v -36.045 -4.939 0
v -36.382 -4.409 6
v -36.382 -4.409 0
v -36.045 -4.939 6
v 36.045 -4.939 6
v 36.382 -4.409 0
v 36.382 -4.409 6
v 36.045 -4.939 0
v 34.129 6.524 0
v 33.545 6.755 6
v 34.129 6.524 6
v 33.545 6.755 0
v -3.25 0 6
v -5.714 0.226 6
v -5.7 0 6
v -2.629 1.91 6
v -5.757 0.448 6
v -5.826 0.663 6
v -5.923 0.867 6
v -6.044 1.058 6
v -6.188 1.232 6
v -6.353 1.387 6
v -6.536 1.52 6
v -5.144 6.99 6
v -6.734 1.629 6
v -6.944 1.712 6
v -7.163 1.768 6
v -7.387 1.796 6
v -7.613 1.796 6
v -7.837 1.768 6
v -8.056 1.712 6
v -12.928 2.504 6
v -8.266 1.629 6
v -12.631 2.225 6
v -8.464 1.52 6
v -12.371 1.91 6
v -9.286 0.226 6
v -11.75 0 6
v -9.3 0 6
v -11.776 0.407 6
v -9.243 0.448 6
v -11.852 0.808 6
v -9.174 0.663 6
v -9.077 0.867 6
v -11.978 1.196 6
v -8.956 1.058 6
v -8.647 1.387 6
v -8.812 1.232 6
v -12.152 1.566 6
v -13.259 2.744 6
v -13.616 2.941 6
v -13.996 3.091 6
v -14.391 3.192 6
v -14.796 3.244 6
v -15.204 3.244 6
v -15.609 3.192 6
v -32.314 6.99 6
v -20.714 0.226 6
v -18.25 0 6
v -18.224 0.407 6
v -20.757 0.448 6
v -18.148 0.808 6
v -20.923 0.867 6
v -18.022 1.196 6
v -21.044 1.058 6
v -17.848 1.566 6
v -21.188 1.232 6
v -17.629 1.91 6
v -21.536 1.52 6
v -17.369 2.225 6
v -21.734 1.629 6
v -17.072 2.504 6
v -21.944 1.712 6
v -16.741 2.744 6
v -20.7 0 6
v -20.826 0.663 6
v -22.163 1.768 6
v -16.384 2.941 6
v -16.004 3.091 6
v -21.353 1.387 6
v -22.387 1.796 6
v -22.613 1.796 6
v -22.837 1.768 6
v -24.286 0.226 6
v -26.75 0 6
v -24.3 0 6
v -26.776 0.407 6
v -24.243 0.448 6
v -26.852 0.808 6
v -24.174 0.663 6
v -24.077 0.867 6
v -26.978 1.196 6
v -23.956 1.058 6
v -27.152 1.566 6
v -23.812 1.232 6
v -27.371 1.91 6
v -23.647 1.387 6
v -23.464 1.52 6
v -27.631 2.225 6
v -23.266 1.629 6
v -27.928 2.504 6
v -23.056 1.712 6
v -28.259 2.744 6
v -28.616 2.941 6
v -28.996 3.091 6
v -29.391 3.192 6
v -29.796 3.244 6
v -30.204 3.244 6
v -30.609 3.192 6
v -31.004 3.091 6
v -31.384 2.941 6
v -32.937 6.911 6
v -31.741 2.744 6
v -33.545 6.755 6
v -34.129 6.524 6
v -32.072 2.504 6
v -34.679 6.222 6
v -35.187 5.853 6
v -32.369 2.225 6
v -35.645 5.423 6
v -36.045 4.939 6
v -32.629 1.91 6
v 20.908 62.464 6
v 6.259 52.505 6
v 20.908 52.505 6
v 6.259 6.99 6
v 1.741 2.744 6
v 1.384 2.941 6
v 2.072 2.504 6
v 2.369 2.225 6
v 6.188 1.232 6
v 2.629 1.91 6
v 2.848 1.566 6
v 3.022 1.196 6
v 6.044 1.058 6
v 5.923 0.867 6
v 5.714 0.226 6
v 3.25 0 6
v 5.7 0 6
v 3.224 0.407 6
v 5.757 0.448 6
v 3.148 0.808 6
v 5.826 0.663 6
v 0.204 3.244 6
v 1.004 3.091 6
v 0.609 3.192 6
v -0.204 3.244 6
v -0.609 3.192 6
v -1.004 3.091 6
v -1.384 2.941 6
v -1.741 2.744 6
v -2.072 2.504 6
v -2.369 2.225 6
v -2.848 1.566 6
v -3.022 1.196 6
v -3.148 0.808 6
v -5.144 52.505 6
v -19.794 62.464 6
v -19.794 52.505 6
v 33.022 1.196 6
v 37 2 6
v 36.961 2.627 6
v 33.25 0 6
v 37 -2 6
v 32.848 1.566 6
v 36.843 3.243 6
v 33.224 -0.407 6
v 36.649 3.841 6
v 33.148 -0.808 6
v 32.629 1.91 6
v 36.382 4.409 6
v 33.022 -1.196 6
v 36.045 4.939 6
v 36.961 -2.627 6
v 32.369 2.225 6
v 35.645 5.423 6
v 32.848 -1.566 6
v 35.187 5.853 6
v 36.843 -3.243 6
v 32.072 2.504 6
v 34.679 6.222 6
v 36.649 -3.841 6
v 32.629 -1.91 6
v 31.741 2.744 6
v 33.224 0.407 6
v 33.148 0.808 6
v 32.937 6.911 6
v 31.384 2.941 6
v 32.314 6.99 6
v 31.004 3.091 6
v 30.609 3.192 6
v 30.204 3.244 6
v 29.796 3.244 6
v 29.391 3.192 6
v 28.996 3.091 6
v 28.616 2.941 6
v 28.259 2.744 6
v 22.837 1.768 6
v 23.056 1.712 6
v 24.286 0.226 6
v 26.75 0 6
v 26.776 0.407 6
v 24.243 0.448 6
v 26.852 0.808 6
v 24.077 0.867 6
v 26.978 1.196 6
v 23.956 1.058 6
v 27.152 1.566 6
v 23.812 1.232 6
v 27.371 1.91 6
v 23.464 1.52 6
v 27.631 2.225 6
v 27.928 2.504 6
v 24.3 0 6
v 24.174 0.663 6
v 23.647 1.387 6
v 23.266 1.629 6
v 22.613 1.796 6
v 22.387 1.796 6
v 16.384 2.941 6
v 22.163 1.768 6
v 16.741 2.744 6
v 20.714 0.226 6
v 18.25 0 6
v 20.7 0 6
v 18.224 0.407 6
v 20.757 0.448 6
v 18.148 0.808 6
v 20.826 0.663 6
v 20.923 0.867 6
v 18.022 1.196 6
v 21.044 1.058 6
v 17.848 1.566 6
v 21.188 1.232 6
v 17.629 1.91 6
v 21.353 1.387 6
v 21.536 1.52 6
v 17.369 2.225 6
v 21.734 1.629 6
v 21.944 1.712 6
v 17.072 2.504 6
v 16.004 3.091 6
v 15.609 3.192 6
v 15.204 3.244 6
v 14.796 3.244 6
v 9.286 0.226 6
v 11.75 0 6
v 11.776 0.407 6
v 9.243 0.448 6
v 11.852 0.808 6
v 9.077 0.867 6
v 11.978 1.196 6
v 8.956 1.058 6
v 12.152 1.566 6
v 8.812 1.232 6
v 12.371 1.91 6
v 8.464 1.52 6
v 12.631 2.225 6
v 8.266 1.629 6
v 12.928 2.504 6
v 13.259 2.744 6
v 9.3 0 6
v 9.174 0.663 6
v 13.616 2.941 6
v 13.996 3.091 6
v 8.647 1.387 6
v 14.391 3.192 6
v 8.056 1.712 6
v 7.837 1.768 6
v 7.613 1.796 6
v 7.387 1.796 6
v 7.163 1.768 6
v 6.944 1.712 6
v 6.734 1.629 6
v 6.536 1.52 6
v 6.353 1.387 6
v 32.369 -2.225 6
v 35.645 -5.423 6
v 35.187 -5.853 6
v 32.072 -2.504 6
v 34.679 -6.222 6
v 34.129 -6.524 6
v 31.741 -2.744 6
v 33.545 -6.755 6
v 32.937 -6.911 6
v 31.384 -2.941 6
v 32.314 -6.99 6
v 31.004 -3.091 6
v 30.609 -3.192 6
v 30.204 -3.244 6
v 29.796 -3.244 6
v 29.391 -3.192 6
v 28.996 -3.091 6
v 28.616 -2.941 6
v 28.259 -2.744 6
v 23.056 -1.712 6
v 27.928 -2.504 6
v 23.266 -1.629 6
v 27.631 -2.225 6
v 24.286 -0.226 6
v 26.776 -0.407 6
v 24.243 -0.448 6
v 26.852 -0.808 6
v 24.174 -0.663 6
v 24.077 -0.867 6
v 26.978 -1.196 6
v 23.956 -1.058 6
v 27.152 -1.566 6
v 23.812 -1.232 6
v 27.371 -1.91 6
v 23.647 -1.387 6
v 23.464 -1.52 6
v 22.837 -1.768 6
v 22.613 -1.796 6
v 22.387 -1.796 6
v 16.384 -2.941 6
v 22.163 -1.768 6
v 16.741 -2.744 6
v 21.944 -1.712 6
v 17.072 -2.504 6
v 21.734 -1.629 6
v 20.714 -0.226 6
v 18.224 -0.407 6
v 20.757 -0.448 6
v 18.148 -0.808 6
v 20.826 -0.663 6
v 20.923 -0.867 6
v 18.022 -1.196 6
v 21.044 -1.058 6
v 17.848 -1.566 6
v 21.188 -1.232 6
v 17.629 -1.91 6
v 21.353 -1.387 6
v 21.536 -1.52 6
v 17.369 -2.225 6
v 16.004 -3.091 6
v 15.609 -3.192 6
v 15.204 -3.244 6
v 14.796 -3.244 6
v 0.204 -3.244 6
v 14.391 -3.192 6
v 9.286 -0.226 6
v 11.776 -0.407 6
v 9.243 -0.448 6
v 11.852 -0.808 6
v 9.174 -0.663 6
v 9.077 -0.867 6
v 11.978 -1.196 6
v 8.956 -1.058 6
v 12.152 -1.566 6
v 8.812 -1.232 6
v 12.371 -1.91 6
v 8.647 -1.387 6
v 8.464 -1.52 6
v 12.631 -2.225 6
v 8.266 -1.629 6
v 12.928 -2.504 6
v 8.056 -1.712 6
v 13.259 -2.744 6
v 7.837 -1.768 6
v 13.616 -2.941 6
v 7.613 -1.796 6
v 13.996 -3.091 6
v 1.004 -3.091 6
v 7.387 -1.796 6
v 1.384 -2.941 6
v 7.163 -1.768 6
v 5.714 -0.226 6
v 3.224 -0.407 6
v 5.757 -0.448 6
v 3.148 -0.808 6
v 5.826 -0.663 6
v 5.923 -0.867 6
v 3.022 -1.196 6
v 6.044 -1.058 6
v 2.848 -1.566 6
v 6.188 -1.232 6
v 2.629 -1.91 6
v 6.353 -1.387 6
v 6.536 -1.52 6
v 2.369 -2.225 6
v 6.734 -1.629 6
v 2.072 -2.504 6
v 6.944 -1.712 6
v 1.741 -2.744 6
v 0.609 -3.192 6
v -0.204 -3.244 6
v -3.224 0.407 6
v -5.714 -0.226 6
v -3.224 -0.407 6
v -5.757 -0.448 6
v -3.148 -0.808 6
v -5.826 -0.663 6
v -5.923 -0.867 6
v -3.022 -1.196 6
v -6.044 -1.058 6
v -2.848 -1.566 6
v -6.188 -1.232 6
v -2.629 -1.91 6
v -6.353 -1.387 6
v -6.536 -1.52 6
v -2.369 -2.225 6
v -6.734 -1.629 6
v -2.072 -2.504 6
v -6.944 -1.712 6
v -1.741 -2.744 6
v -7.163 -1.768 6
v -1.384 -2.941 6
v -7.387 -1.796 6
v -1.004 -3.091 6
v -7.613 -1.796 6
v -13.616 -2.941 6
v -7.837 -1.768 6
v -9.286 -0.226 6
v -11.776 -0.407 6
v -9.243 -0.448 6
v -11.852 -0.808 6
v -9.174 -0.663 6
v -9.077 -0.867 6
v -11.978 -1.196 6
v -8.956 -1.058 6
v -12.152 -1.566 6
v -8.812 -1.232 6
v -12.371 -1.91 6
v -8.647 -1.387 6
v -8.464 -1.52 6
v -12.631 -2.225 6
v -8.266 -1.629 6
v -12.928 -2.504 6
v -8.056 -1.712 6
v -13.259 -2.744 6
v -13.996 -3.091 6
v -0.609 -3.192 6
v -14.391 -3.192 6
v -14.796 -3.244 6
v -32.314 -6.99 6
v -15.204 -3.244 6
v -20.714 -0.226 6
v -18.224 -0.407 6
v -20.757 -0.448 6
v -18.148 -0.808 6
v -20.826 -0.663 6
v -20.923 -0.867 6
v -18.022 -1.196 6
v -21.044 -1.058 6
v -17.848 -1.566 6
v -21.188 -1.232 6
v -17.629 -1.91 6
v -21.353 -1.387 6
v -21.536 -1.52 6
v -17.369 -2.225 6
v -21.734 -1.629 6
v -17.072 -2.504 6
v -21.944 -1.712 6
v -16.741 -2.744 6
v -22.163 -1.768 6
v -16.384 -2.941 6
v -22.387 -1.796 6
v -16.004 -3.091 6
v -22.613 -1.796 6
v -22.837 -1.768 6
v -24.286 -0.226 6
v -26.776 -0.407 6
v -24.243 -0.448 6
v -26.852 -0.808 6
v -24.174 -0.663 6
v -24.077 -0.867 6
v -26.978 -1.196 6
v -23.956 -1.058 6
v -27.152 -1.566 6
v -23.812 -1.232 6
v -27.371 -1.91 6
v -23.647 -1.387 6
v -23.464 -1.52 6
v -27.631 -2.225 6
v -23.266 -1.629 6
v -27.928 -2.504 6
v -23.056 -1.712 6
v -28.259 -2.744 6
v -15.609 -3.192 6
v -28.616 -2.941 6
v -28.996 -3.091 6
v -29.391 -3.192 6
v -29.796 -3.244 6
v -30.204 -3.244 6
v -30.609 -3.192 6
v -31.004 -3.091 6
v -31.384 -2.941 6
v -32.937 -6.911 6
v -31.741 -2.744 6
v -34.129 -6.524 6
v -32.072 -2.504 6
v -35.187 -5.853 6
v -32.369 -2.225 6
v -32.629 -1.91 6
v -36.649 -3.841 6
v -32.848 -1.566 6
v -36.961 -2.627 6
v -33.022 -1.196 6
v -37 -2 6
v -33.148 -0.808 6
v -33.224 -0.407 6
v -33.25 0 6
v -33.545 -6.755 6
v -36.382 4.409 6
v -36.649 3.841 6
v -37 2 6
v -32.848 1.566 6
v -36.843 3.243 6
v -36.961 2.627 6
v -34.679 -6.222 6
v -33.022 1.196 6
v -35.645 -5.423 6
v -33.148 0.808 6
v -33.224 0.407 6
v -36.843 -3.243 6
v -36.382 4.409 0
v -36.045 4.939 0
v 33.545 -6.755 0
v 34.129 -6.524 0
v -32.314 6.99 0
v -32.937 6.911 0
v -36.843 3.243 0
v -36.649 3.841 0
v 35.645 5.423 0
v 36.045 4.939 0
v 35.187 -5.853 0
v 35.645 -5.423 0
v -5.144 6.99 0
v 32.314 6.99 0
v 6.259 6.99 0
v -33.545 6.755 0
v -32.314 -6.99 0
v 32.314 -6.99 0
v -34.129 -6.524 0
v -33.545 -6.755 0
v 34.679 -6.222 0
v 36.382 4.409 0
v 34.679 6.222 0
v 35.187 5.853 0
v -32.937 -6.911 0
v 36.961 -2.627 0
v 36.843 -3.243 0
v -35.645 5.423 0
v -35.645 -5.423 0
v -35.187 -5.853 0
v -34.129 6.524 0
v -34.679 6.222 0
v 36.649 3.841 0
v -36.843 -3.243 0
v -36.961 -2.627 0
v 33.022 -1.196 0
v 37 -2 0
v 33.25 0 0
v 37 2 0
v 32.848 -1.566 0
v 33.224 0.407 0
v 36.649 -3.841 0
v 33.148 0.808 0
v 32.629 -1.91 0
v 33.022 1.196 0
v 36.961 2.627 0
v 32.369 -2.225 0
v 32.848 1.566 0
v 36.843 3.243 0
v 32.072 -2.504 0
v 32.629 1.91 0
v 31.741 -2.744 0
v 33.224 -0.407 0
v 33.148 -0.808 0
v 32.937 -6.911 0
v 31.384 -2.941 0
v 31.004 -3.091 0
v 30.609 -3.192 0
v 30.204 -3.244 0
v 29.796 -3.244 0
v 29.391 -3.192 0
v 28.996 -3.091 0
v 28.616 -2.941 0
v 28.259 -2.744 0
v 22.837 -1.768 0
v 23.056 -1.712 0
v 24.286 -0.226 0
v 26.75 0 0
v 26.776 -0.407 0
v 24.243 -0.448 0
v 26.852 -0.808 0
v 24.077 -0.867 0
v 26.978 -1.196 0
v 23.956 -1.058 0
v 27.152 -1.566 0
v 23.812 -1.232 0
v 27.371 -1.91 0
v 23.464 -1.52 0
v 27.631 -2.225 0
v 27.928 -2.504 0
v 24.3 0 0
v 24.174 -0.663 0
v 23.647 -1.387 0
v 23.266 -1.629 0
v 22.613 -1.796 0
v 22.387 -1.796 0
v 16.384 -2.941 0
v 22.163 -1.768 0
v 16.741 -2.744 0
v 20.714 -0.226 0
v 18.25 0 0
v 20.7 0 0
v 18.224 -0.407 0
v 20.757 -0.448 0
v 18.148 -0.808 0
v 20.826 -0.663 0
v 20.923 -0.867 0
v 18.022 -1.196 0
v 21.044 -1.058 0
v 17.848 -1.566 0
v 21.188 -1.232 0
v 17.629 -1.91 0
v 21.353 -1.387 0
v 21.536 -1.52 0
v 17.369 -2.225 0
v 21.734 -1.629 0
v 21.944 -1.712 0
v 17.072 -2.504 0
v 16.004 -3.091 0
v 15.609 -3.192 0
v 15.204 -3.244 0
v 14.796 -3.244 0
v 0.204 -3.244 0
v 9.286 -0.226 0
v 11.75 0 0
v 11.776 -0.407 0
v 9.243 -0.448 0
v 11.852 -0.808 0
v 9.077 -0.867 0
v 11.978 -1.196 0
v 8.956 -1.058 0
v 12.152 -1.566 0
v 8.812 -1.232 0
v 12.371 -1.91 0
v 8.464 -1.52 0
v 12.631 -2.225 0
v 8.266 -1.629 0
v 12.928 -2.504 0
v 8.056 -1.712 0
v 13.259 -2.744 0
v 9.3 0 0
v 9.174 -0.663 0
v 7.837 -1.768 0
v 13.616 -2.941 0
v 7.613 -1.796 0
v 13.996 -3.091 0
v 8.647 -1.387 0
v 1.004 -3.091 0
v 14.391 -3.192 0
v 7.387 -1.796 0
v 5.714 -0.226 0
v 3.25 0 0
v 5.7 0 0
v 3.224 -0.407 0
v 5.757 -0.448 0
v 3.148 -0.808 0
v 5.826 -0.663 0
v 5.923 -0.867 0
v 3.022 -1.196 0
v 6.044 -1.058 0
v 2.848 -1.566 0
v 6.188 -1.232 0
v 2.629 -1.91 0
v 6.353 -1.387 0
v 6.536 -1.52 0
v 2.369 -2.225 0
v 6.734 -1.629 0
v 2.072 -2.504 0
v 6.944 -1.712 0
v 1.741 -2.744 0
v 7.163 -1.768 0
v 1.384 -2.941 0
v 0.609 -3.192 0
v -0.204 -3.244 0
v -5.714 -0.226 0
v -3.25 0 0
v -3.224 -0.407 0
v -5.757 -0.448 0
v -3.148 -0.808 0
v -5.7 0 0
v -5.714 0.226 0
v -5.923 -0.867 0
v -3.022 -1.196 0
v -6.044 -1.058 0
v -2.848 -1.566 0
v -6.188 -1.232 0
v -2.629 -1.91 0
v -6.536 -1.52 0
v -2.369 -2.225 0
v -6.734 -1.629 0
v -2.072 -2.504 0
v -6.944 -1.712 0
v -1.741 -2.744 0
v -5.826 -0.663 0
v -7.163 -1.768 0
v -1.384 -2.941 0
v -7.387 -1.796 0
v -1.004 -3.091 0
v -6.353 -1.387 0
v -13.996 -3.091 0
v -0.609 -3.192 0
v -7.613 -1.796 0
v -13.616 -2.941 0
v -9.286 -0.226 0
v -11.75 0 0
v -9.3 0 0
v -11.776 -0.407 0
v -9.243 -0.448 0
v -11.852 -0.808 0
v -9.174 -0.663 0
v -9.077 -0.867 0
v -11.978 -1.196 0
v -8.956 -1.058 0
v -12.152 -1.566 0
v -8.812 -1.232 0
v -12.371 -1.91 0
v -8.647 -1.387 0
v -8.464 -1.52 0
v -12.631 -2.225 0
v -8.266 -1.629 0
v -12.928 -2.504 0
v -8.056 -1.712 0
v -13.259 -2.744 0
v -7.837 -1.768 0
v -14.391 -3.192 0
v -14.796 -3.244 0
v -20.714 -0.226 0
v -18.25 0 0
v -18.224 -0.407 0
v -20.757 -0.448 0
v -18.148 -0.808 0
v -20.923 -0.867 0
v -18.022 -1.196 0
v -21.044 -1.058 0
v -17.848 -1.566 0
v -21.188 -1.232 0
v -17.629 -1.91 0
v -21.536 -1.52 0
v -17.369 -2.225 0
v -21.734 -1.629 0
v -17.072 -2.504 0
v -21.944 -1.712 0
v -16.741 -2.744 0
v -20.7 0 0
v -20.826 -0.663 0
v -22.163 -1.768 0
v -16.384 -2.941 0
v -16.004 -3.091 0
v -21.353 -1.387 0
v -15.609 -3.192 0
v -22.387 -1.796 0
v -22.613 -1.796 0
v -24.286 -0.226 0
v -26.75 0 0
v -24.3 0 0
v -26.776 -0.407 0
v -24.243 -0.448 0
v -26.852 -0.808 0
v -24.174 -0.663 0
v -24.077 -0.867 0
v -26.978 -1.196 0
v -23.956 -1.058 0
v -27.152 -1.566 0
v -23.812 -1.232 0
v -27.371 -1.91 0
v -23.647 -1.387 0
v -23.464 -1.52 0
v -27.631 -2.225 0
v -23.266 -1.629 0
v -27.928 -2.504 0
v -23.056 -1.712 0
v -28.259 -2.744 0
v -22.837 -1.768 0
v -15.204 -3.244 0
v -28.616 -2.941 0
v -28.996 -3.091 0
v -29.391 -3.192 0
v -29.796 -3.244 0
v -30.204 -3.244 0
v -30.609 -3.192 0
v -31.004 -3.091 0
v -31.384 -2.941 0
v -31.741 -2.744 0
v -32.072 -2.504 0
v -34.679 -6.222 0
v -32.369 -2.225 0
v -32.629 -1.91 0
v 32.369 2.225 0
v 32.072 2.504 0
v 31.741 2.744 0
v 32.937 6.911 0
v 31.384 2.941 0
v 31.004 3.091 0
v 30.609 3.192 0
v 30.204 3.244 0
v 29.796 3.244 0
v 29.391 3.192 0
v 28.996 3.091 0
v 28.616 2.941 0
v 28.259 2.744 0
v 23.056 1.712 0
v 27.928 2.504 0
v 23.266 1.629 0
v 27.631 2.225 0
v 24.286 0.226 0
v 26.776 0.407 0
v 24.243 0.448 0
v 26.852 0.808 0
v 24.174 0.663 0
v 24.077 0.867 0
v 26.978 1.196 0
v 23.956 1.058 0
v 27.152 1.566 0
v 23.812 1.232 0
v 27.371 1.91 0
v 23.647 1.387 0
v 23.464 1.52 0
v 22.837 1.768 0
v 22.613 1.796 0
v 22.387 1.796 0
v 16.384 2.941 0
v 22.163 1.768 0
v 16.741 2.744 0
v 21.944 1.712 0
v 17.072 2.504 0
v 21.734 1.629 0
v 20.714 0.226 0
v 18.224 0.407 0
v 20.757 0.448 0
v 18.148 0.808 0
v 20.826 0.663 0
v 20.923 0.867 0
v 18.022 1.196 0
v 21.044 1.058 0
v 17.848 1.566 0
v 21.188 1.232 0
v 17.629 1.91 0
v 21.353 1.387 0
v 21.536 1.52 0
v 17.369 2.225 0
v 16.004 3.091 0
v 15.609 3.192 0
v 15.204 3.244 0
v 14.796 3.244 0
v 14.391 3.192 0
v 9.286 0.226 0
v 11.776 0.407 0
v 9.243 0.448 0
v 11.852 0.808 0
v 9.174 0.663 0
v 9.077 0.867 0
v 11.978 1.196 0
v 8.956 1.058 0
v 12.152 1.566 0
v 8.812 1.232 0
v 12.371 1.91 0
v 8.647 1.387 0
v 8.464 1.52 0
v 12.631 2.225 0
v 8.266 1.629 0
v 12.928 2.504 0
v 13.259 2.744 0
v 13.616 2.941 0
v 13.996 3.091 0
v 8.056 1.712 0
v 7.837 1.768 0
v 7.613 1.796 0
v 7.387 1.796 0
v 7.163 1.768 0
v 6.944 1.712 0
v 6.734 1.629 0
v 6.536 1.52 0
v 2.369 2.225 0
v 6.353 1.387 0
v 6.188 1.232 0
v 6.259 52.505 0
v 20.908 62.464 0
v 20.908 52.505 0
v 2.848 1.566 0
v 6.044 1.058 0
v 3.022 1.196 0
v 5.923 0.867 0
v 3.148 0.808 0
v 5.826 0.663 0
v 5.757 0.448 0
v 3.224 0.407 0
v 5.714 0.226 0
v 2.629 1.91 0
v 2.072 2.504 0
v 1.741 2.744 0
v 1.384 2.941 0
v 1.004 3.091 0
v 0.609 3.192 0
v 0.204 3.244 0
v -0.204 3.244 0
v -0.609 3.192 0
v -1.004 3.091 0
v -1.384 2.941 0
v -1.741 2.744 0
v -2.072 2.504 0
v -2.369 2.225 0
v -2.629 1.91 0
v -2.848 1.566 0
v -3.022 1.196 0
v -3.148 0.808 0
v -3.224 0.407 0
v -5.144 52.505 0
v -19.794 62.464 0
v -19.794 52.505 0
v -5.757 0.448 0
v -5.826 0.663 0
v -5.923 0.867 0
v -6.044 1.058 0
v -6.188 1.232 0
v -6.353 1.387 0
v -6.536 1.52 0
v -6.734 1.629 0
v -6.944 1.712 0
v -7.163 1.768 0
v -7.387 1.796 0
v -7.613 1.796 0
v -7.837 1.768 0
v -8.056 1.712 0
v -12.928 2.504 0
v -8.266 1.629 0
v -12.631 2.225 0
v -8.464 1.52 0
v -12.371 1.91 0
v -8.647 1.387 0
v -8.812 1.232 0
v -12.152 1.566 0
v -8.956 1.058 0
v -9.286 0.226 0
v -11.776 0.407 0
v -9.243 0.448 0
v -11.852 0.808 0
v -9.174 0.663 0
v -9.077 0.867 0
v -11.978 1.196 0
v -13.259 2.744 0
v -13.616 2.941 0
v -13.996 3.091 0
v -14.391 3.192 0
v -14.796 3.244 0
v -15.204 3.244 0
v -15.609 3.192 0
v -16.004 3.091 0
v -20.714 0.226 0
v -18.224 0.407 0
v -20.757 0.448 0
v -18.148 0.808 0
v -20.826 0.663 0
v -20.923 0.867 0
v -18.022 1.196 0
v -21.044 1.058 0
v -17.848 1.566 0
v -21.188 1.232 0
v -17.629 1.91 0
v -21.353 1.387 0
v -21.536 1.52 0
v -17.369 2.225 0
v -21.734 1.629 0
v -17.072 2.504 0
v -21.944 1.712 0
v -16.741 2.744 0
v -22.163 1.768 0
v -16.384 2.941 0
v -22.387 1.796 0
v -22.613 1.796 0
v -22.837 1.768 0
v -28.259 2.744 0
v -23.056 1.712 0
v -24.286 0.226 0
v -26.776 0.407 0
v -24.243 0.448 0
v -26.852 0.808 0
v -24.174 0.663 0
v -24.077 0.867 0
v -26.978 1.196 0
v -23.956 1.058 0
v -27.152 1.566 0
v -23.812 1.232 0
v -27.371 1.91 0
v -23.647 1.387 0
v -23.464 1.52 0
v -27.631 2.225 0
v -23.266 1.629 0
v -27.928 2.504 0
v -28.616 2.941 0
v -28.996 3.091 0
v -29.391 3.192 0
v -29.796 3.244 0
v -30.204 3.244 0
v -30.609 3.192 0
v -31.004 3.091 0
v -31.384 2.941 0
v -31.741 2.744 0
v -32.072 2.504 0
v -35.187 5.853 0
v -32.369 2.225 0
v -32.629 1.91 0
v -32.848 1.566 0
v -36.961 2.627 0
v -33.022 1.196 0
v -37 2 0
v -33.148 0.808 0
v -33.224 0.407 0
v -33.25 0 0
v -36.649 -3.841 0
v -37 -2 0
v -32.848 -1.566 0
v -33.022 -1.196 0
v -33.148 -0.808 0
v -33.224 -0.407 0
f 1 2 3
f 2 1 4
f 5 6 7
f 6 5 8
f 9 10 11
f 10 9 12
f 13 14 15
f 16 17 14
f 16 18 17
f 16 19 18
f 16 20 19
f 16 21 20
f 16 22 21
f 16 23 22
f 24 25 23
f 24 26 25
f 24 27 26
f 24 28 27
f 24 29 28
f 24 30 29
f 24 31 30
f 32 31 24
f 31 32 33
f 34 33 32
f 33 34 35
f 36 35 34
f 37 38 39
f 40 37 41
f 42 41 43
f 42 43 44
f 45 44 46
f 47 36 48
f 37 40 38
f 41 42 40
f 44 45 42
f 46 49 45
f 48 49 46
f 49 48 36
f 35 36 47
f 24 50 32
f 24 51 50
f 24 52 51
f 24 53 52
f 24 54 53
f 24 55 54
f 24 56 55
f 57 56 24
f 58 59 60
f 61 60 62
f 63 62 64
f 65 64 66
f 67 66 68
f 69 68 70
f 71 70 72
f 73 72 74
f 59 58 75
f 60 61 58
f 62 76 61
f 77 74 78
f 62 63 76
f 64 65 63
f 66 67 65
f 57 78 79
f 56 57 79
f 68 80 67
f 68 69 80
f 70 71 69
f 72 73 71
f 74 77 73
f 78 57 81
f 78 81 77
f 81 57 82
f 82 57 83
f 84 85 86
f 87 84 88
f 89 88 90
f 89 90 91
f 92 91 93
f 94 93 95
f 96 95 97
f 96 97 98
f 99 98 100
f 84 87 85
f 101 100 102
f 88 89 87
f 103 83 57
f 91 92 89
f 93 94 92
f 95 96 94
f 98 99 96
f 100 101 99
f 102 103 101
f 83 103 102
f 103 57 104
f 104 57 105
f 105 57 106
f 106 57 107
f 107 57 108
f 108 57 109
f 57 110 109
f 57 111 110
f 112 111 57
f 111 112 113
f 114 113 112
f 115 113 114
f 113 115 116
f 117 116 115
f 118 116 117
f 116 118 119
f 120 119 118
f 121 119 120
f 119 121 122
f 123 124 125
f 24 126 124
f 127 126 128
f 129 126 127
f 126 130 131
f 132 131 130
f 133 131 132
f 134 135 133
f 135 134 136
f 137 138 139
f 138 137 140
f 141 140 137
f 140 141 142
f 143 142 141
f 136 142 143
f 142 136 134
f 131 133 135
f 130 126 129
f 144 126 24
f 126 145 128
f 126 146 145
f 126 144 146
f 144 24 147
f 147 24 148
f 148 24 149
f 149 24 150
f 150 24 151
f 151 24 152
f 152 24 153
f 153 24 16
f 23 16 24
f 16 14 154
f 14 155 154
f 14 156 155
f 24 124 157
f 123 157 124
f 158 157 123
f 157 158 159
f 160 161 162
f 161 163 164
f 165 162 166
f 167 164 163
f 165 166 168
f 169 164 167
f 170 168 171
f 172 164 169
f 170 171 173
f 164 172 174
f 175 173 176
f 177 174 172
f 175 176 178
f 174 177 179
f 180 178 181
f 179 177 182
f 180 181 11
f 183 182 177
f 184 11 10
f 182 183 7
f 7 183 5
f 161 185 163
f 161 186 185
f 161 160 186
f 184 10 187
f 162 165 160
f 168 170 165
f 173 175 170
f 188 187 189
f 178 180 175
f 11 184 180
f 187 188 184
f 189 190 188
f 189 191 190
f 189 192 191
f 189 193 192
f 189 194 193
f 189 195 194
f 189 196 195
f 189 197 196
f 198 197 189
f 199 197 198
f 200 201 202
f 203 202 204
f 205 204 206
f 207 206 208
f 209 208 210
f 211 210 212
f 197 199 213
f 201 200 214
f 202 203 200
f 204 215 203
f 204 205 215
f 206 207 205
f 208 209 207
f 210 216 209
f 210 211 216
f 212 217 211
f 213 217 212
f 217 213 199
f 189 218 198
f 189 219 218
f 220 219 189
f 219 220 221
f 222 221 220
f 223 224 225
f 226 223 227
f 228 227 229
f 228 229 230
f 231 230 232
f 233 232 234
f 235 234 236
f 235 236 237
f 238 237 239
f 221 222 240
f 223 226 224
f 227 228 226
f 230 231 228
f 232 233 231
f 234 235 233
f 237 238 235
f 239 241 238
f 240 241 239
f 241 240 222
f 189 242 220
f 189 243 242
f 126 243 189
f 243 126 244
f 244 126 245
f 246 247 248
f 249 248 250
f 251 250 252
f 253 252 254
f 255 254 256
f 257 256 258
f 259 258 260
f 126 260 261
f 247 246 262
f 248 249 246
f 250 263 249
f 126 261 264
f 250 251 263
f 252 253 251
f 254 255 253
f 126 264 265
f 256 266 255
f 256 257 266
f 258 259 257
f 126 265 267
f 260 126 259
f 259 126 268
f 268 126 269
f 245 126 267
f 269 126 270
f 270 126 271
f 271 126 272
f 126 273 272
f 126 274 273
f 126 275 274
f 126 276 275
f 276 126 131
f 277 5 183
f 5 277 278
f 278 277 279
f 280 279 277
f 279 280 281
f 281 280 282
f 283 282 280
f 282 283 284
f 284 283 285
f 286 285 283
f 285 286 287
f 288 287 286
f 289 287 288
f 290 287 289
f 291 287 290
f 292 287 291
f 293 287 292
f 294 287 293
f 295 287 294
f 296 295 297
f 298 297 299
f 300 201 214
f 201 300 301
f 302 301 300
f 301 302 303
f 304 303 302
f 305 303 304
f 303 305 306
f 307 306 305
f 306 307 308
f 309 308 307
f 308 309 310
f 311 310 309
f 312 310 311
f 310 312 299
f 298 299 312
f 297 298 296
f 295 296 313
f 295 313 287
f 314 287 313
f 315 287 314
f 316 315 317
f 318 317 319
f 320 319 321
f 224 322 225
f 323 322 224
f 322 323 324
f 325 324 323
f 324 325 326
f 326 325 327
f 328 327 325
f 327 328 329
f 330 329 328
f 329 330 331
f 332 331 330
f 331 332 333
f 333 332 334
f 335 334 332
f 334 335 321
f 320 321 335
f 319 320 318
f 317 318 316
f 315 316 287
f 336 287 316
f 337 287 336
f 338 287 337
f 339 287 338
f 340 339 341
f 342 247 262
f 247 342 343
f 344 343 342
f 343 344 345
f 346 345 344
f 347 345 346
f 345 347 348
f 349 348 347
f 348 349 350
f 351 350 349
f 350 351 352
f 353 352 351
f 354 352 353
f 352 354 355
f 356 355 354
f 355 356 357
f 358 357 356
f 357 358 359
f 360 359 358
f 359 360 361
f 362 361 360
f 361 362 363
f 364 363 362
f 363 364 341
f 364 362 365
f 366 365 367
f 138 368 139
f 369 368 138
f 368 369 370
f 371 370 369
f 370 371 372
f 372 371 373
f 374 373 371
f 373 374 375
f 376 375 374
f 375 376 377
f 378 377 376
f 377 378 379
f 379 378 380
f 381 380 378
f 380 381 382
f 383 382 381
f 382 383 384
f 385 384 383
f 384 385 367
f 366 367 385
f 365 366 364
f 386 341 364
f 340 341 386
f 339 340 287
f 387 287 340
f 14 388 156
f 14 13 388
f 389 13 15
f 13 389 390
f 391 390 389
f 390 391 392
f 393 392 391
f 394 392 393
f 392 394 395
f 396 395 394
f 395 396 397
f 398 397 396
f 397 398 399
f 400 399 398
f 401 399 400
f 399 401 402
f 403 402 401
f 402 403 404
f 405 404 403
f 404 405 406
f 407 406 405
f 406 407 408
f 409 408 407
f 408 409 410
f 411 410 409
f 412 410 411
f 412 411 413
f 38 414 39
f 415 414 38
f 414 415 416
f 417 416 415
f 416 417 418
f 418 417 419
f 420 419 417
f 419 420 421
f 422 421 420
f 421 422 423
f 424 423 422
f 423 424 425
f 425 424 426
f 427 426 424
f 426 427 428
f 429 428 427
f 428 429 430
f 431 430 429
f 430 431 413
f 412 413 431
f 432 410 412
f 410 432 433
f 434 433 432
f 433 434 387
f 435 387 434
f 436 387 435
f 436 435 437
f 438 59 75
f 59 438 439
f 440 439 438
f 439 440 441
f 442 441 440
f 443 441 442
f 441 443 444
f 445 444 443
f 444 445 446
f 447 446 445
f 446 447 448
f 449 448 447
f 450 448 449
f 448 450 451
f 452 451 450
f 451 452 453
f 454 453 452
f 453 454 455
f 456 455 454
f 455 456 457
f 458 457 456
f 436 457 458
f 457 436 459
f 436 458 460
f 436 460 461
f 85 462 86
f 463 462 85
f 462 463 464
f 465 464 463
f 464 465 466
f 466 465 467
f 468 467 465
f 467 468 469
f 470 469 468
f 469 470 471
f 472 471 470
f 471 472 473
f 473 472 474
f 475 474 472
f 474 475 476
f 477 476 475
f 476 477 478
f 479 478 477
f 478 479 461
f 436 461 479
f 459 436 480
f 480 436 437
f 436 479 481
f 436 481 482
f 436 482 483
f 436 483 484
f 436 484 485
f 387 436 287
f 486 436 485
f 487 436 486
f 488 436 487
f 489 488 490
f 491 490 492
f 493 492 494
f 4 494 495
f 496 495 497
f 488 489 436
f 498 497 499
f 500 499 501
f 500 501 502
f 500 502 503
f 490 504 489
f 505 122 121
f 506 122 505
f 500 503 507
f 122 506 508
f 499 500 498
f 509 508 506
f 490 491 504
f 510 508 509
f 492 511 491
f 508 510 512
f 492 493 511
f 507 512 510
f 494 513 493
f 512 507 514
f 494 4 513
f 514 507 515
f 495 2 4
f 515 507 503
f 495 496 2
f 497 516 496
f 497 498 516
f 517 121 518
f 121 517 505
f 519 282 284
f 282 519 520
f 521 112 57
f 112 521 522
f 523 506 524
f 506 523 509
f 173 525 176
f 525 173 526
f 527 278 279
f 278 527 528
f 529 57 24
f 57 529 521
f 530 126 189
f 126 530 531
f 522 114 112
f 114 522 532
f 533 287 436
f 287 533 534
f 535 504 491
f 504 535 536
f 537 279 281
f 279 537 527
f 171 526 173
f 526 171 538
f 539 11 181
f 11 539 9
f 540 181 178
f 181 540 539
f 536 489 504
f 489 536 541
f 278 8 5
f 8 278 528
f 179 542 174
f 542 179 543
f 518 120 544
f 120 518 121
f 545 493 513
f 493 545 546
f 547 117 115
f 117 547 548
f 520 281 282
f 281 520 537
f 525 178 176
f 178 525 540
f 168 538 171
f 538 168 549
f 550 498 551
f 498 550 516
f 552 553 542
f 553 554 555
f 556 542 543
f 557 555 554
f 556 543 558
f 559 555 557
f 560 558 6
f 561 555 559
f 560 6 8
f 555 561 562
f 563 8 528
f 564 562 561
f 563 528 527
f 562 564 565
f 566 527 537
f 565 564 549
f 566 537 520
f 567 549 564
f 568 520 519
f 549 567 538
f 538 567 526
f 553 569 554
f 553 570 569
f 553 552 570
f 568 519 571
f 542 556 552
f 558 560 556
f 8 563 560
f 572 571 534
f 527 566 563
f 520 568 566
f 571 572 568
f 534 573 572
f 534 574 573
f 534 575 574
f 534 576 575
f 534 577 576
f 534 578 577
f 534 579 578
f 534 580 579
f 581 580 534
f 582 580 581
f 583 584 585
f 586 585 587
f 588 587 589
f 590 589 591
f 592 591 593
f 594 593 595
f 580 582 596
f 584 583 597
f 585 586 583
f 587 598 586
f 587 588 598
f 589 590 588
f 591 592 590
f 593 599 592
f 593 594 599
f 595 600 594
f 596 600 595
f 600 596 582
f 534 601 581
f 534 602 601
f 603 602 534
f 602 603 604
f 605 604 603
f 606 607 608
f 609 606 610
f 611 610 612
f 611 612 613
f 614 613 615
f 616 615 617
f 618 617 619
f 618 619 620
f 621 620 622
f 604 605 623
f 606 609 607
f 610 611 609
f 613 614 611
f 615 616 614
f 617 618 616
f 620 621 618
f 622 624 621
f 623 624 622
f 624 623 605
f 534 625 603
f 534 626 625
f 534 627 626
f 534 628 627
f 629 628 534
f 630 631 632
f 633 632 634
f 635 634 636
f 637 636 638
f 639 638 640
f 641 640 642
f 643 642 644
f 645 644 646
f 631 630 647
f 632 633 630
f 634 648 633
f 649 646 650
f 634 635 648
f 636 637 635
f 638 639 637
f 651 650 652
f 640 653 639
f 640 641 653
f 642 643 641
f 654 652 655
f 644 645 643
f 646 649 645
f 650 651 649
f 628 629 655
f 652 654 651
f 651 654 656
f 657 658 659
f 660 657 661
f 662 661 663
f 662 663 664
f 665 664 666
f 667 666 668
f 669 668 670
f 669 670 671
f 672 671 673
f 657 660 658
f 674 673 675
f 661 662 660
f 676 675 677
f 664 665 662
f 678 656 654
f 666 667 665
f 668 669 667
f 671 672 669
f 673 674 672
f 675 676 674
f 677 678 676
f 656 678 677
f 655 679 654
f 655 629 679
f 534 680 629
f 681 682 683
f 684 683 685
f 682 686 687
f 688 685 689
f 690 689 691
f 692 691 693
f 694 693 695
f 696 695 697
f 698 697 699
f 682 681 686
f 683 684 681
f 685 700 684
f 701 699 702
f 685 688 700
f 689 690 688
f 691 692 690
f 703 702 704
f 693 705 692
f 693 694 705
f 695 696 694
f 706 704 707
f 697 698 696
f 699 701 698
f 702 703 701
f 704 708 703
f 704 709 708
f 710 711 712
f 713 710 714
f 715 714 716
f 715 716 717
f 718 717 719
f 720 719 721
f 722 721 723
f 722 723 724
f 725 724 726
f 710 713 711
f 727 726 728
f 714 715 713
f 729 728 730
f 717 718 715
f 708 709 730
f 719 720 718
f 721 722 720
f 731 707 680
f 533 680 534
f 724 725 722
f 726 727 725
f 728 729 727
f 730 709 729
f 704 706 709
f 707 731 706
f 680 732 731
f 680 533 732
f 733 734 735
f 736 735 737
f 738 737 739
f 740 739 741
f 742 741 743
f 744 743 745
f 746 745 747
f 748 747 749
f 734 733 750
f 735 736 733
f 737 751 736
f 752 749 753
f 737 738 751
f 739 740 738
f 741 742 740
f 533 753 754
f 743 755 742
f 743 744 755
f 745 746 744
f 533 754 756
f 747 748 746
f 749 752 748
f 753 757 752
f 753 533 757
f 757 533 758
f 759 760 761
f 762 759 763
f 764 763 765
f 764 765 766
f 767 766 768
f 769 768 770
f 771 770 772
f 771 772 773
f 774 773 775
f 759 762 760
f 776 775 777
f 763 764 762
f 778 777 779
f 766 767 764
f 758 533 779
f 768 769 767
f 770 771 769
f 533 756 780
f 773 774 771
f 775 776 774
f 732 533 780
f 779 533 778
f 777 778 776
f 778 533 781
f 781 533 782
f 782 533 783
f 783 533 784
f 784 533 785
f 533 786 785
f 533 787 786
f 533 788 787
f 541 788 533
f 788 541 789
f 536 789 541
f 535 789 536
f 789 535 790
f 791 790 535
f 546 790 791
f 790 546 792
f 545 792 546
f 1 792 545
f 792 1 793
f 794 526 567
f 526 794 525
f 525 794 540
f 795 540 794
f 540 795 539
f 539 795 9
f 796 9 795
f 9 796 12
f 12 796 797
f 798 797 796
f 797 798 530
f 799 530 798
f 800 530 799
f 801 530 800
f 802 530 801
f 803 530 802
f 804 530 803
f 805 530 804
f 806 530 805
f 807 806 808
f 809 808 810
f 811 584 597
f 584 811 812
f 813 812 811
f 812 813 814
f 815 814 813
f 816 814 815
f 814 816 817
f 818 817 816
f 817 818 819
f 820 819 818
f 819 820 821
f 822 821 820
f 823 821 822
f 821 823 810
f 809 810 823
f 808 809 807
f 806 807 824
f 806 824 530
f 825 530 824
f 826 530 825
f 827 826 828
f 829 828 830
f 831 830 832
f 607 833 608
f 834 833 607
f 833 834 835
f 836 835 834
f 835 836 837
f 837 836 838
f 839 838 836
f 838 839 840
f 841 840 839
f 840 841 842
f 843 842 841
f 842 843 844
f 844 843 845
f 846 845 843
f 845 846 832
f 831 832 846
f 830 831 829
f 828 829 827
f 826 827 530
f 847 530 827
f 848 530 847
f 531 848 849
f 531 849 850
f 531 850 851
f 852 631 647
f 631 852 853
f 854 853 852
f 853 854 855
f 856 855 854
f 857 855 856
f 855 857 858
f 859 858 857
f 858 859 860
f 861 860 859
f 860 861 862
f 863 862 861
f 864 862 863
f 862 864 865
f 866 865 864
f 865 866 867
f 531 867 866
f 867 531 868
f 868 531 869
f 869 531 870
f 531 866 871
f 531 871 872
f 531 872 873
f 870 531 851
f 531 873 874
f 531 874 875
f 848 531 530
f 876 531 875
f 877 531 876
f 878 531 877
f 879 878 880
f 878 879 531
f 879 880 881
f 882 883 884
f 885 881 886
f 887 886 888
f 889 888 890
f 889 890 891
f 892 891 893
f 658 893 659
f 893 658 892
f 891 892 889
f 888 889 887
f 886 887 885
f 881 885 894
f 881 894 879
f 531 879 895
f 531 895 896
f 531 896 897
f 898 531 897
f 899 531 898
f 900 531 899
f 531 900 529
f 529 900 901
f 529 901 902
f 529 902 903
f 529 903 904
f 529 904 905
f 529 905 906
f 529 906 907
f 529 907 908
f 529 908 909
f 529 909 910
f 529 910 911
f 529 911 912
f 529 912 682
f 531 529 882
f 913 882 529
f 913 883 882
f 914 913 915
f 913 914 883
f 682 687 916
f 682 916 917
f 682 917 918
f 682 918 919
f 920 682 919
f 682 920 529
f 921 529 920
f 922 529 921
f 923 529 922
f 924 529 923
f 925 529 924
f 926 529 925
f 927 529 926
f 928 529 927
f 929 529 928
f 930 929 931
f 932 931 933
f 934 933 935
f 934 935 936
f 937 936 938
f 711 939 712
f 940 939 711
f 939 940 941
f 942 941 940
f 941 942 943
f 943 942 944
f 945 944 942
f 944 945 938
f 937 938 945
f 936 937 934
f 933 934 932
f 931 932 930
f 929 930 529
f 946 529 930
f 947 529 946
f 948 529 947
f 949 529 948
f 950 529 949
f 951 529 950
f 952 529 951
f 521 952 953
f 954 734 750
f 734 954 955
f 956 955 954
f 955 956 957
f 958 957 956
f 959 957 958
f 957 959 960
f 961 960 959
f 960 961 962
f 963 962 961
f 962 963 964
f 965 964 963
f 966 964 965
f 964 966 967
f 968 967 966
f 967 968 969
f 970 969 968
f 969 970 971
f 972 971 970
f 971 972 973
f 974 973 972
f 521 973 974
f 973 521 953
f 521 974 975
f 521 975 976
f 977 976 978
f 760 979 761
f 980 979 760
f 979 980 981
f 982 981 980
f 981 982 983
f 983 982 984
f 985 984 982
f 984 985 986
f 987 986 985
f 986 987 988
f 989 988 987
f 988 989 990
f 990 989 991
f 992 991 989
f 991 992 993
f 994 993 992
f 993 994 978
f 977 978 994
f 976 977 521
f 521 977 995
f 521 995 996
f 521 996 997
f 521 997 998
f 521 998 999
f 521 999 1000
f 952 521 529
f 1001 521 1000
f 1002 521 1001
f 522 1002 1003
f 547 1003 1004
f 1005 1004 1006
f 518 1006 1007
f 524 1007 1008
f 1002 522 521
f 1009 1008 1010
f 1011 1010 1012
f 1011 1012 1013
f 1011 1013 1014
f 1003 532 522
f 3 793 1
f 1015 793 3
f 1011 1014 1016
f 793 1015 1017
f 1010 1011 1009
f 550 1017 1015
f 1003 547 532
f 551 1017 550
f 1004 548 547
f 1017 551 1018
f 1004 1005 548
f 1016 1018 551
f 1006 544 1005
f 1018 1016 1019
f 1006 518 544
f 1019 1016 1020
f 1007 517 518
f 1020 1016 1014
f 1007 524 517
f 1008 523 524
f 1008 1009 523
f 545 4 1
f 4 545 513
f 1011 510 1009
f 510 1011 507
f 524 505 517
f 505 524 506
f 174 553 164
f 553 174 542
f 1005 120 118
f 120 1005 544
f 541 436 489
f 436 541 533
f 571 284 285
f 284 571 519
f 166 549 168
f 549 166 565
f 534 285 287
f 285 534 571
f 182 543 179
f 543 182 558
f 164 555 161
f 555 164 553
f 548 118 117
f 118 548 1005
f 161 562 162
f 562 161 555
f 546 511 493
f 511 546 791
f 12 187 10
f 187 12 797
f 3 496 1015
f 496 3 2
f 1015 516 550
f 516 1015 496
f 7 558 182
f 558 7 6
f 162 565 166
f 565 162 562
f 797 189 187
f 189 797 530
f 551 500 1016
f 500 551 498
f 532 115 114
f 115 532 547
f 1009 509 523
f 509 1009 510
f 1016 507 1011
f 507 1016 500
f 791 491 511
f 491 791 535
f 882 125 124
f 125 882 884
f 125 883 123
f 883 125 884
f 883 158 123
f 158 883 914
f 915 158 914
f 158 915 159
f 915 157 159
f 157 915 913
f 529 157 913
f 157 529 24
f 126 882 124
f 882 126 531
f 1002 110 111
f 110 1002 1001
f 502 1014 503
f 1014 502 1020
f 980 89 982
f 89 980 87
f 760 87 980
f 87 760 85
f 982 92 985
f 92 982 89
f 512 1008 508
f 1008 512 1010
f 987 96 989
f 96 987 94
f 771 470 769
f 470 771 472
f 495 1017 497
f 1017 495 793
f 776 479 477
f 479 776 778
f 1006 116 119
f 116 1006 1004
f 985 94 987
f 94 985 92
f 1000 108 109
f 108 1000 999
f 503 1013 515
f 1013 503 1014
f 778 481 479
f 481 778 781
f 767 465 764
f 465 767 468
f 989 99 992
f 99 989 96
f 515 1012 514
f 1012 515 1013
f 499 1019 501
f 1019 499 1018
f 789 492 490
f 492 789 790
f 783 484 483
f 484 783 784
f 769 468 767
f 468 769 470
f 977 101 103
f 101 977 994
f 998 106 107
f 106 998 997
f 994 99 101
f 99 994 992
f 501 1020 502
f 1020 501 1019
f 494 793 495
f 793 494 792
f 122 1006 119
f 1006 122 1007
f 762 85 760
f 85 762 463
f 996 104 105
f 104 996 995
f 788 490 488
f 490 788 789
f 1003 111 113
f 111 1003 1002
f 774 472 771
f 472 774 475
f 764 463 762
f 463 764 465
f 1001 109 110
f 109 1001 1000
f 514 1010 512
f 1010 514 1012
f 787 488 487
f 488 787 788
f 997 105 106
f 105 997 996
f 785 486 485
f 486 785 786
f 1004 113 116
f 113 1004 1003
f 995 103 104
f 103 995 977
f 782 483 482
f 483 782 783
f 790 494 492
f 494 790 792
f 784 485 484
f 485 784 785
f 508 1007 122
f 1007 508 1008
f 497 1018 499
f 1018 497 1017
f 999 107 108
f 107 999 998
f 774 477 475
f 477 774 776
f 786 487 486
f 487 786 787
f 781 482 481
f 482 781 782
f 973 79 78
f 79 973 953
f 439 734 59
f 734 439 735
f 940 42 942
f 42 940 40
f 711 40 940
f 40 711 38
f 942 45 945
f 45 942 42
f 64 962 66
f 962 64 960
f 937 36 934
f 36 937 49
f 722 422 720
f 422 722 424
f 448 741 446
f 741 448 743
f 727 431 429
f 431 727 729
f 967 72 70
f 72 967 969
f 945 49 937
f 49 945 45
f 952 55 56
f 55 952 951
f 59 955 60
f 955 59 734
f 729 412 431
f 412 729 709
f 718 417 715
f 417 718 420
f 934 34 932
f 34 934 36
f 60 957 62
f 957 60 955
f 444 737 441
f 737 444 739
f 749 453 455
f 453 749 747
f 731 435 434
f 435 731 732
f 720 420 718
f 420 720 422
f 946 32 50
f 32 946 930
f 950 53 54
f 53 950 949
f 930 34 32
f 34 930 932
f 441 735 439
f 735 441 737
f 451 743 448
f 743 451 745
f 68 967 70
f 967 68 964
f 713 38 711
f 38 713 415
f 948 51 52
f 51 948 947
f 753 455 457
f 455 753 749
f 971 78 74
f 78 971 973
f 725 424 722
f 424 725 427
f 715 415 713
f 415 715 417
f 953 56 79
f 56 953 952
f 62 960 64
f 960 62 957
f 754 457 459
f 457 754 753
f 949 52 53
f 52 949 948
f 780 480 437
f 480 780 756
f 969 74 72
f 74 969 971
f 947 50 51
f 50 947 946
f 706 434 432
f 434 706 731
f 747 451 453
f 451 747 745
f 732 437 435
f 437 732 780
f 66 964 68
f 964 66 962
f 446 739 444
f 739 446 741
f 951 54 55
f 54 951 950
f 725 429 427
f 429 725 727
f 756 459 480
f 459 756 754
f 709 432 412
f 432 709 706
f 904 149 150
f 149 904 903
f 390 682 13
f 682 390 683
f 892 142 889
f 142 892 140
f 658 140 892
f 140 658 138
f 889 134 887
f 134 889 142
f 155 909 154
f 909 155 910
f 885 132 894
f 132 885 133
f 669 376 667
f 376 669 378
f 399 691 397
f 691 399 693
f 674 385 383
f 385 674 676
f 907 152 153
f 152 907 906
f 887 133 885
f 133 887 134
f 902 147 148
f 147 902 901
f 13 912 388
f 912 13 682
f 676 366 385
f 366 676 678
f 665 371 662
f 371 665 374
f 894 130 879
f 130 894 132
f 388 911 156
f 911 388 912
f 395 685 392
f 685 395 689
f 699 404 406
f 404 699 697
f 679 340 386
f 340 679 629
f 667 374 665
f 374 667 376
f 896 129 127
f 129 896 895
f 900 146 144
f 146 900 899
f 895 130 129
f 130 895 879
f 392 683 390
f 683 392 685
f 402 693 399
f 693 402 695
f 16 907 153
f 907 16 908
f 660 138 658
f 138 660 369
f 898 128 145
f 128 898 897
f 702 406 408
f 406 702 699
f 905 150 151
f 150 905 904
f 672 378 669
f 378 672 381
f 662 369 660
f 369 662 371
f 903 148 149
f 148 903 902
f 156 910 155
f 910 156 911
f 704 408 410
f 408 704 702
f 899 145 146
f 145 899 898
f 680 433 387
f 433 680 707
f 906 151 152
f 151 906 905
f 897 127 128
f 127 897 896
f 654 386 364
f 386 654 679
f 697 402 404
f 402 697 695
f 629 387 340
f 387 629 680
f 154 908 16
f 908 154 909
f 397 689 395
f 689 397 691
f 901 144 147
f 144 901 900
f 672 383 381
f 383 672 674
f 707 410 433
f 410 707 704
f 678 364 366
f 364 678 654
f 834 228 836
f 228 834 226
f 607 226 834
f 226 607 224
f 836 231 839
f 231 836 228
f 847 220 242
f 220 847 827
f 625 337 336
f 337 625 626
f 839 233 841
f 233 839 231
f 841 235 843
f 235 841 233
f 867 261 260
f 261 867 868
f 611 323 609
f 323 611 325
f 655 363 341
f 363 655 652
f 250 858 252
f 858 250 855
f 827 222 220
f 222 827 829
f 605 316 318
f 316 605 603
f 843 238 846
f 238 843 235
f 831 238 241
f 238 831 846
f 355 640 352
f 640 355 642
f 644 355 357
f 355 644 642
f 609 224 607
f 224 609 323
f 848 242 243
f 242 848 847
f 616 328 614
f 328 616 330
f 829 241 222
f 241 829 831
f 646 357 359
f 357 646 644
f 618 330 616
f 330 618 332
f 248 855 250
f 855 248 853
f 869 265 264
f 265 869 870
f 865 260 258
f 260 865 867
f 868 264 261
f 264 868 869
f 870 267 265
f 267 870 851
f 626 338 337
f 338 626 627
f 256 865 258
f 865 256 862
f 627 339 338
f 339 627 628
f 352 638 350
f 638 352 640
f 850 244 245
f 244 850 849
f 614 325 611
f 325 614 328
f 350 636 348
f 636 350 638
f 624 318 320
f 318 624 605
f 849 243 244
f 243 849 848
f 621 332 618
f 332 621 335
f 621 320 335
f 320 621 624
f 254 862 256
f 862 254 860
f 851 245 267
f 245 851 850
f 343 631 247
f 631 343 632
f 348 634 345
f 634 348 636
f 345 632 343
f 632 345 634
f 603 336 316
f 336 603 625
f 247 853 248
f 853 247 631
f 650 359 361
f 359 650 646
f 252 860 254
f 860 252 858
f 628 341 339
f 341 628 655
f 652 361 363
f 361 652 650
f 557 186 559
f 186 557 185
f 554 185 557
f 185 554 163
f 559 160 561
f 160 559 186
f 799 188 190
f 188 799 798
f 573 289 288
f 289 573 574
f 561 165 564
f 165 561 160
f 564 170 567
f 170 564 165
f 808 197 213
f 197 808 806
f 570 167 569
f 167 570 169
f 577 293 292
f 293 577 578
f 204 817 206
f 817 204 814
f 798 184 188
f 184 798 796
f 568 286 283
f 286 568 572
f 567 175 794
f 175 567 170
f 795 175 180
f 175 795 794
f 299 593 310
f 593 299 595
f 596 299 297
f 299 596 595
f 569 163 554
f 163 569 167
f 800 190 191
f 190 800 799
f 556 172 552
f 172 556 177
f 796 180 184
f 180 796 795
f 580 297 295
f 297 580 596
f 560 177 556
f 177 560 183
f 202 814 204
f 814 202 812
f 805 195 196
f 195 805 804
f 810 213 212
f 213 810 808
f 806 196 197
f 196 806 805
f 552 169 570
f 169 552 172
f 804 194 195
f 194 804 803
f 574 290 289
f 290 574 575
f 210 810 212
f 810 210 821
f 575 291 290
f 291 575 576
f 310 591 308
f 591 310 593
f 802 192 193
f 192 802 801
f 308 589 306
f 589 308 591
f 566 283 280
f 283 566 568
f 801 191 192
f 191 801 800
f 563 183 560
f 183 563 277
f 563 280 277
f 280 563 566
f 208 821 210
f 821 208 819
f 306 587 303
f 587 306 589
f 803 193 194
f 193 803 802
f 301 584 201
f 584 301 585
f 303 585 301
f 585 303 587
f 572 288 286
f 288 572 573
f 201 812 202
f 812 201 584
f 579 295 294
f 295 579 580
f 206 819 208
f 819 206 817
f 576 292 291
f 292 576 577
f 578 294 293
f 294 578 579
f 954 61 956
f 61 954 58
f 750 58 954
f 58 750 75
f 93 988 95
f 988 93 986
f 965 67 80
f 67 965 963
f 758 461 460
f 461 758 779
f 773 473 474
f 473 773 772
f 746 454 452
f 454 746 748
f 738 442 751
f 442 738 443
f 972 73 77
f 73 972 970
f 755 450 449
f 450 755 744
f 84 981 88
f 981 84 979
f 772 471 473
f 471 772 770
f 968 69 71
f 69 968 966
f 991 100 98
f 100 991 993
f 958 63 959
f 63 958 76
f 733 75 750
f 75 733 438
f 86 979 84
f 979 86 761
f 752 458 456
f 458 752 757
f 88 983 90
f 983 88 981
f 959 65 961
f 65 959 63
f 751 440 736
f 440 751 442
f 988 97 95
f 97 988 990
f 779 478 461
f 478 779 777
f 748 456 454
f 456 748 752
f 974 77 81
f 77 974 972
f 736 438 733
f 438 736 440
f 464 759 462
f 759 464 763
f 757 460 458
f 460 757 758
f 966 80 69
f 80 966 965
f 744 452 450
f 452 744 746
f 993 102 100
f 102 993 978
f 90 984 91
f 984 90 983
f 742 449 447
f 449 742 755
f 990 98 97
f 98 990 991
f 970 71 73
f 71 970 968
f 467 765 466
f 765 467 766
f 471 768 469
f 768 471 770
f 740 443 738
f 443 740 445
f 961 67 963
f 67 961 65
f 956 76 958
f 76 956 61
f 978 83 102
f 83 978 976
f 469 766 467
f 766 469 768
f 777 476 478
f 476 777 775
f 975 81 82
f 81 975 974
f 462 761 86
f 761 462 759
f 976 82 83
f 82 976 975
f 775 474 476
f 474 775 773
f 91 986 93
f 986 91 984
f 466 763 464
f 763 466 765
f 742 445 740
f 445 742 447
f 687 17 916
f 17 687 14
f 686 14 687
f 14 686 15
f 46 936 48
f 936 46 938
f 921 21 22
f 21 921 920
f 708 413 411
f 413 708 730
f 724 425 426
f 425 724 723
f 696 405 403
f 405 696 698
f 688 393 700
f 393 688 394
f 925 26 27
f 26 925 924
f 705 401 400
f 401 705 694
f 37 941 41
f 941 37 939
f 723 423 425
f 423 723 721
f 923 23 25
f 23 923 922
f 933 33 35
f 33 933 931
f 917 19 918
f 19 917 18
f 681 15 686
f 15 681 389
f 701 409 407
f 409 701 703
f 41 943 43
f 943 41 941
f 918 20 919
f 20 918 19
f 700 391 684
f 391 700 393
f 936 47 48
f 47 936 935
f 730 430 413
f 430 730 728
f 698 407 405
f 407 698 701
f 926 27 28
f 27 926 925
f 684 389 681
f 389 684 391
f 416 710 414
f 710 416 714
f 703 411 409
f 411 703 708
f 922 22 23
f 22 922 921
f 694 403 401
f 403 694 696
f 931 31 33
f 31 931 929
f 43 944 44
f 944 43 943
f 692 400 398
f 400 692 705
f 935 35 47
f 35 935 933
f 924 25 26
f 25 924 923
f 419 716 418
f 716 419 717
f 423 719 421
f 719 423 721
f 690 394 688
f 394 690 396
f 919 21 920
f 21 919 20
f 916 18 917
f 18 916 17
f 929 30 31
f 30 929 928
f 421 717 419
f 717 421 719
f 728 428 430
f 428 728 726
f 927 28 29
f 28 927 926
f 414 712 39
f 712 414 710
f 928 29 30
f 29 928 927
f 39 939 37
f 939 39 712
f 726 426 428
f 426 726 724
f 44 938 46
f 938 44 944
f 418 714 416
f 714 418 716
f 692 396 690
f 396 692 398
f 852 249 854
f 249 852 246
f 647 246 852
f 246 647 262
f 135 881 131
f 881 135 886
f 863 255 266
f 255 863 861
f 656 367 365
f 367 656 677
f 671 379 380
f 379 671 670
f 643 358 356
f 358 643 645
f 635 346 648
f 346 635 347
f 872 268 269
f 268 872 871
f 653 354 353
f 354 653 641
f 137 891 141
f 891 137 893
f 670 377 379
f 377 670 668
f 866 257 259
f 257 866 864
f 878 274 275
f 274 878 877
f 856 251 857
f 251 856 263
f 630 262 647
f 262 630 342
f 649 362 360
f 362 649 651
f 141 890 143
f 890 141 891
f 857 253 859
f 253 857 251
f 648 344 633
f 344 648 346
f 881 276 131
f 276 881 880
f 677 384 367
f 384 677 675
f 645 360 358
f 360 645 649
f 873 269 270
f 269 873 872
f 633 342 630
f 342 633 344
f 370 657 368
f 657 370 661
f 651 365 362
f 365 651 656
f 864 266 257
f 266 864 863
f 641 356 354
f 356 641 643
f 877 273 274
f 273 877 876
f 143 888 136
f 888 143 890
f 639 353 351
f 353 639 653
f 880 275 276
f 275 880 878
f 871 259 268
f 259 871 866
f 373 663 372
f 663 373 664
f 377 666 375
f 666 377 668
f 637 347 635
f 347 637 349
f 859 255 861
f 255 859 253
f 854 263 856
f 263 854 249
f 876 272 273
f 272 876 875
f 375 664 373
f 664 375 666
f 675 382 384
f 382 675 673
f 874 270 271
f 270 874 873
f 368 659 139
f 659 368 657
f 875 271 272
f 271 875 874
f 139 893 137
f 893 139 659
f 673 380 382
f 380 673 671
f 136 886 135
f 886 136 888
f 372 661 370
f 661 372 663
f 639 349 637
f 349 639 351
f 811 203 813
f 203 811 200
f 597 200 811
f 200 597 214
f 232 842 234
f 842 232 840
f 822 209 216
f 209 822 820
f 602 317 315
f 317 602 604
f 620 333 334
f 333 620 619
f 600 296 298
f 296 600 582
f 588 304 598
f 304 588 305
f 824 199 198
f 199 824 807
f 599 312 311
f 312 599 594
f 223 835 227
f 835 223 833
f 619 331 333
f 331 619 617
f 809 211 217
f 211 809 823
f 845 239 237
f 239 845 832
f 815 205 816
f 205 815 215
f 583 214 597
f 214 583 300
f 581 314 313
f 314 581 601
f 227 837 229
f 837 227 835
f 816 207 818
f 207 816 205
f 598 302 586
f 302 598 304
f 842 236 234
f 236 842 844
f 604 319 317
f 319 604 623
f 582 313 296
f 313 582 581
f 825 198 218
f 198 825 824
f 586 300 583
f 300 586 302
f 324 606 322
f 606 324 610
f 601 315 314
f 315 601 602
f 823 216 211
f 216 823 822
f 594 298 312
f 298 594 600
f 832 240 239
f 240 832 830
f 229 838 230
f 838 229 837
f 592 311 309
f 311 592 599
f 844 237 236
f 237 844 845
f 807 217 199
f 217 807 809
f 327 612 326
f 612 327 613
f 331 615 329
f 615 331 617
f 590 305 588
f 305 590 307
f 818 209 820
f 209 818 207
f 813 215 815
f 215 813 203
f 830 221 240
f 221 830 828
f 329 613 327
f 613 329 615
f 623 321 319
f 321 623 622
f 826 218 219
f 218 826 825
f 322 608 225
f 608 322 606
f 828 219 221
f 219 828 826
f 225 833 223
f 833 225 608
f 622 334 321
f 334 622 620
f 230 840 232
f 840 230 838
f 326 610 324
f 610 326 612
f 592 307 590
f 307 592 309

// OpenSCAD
$fn = 50;


difference() {
	union() {
		hull() {
			translate(v = [-32.0000000000, 2.0000000000, 0]) {
				cylinder(h = 6, r = 5);
			}
			translate(v = [32.0000000000, 2.0000000000, 0]) {
				cylinder(h = 6, r = 5);
			}
			translate(v = [-32.0000000000, -2.0000000000, 0]) {
				cylinder(h = 6, r = 5);
			}
			translate(v = [32.0000000000, -2.0000000000, 0]) {
				cylinder(h = 6, r = 5);
			}
		}
		translate(v = [0, 61.1111111111, 0]) {
			linear_extrude(height = 6) {
				text(font = "DejaVu Sans Mono:style=Bold", halign = "center", size = 57.0000000000, text = "T", valign = "top");
			}
		}
	}
	union() {
		translate(v = [-30.0000000000, 0.0000000000, 0]) {
			translate(v = [0, 0, -100]) {
				cylinder(h = 200, r = 3.2500000000);
			}
		}
		translate(v = [-15.0000000000, 0.0000000000, 0]) {
			translate(v = [0, 0, -100]) {
				cylinder(h = 200, r = 3.2500000000);
			}
		}
		translate(v = [0, 0, -100]) {
			cylinder(h = 200, r = 3.2500000000);
		}
		translate(v = [15.0000000000, 0.0000000000, 0]) {
			translate(v = [0, 0, -100]) {
				cylinder(h = 200, r = 3.2500000000);
			}
		}
		translate(v = [30.0000000000, 0.0000000000, 0]) {
			translate(v = [0, 0, -100]) {
				cylinder(h = 200, r = 3.2500000000);
			}
		}
		translate(v = [-30.0000000000, 0.0000000000, 0]) {
			translate(v = [0, 0, -100]) {
				cylinder(h = 200, r = 1.8000000000);
			}
		}
		translate(v = [-22.5000000000, 0.0000000000, 0]) {
			translate(v = [0, 0, -100]) {
				cylinder(h = 200, r = 1.8000000000);
			}
		}
		translate(v = [-15.0000000000, 0.0000000000, 0]) {
			translate(v = [0, 0, -100]) {
				cylinder(h = 200, r = 1.8000000000);
			}
		}
		translate(v = [-7.5000000000, 0.0000000000, 0]) {
			translate(v = [0, 0, -100]) {
				cylinder(h = 200, r = 1.8000000000);
			}
		}
		translate(v = [0, 0, -100]) {
			cylinder(h = 200, r = 1.8000000000);
		}
		translate(v = [7.5000000000, 0.0000000000, 0]) {
			translate(v = [0, 0, -100]) {
				cylinder(h = 200, r = 1.8000000000);
			}
		}
		translate(v = [15.0000000000, 0.0000000000, 0]) {
			translate(v = [0, 0, -100]) {
				cylinder(h = 200, r = 1.8000000000);
			}
		}
		translate(v = [22.5000000000, 0.0000000000, 0]) {
			translate(v = [0, 0, -100]) {
				cylinder(h = 200, r = 1.8000000000);
			}
		}
		translate(v = [30.0000000000, 0.0000000000, 0]) {
			translate(v = [0, 0, -100]) {
				cylinder(h = 200, r = 1.8000000000);
			}
		}
	}
}
